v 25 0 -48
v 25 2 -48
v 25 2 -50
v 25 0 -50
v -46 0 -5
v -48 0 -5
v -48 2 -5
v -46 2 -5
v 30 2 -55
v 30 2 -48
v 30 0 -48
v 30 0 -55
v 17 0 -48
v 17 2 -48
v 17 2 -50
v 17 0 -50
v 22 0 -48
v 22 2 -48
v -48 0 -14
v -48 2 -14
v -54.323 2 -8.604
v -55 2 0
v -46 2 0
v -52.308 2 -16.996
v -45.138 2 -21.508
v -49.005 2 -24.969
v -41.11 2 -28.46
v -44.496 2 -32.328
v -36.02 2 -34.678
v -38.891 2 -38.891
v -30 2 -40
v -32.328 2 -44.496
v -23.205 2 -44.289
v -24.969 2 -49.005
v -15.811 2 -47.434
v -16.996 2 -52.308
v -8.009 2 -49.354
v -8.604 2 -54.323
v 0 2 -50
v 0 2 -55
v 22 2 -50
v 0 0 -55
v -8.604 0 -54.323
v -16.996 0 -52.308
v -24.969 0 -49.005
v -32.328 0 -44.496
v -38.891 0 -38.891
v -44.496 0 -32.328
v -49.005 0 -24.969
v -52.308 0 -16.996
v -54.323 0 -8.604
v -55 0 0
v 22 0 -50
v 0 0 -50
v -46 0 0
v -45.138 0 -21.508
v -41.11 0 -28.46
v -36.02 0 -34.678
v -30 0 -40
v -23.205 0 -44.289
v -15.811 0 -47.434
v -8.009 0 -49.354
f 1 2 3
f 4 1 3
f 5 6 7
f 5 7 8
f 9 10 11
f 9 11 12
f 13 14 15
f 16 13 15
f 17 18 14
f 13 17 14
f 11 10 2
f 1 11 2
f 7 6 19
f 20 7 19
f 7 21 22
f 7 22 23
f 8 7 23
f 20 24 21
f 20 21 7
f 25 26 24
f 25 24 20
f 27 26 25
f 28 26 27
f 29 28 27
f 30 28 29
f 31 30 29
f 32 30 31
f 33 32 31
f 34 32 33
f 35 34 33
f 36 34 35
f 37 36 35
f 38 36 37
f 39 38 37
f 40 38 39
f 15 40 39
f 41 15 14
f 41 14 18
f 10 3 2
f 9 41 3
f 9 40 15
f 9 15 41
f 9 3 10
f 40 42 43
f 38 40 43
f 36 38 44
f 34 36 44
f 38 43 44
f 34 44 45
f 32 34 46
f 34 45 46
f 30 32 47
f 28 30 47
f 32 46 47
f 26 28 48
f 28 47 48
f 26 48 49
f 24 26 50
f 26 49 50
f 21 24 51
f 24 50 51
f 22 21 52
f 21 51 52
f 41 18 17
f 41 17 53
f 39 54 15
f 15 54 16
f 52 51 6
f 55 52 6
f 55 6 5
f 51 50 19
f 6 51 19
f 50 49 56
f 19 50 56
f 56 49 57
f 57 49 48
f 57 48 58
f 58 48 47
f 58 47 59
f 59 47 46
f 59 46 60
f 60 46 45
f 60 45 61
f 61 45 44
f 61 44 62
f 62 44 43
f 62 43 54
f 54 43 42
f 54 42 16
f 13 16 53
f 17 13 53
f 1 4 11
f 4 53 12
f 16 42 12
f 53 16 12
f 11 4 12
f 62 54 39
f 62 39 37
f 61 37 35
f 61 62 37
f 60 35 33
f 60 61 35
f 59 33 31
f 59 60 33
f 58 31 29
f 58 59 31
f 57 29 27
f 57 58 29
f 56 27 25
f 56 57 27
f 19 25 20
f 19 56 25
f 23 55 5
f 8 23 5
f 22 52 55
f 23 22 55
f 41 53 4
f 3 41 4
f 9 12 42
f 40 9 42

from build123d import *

# Parameters (mm, degrees)
SKETCH1_R              = 50
BOSS_EXTRUDE2_DEPTH    = 2
SPLIT1_SURFACE_1_BACK  = 156.576
SPLIT1_SURFACE_1_DEPTH = 313.152
SPLIT1_SURFACE_2_BACK  = 156.576
SPLIT1_SURFACE_2_DEPTH = 313.152
BODY_DELETE1_DEPTH     = 2
BOSS_EXTRUDE3_DEPTH    = 2
BOSS_EXTRUDE5_START    = -2
SKETCH4_W              = 2
SKETCH4_H              = 5
BOSS_EXTRUDE5_DEPTH    = 2


# Read off the part's stored shape, not the designer's step: Body-Delete1
with BuildPart() as part:
    # Sketch1 → Boss-Extrude2 (new body)
    with BuildSketch(Plane(origin=(0, 0, 0), x_dir=(1, 0, 0), z_dir=(0, 1, 0))):
        with BuildLine():
            Line((22.912878475, 50), (30, 50))
            Line((30, 50), (30, 55))
            Line((30, 55), (0, 55))
            ThreePointArc((0, 55), (-11.7260394, -53.735463151), (22.912878475, 50))
        make_face()
        with Locations(Location((0, 0, 0), (0, 0, 270))):
            Circle(SKETCH1_R, mode=Mode.SUBTRACT)
    extrude(amount=BOSS_EXTRUDE2_DEPTH)


with BuildPart() as body_2:
    # Split1: the piece behind the surface
    add(part.part)
    # Split1 surface: a surface, the sketch's curves swept straight by 313.152 mm
    with BuildLine(Plane(origin=(0, 2, 0), x_dir=(1, 0, 0), z_dir=(0, 1, 0)).offset(-SPLIT1_SURFACE_1_BACK), mode=Mode.PRIVATE) as split1_surface_1_path:
        Line((0, 50), (71.831983425, 50))
        Line((71.831983425, 50), (71.831983425, -59.181674134))
        Line((71.831983425, -59.181674134), (-65.509549092, -59.181674134))
        Line((-65.509549092, -59.181674134), (-65.509549092, 0))
        Line((-65.509549092, 0), (0, 0))
        Line((0, 0), (0, 50))
    split1_surface_1 = Shell.extrude(split1_surface_1_path.wire(), (0 * SPLIT1_SURFACE_1_DEPTH, 1 * SPLIT1_SURFACE_1_DEPTH, 0 * SPLIT1_SURFACE_1_DEPTH))
    split(bisect_by=split1_surface_1, keep=Keep.BOTTOM)

    # Body-Delete1 outline → Body-Delete1 (cut)
    with BuildSketch(Plane(origin=(0, 0, 0), x_dir=(1, 0, 0), z_dir=(0, 1, 0))):
        with BuildLine():
            ThreePointArc((-55, 0), (29.705148408, -46.28827236), (22.912878475, 50))
            Line((22.912878475, 50), (0, 50))
            ThreePointArc((0, 50), (35.355339059, -35.355339059), (-50, 0))
            Line((-50, 0), (-55, 0))
        make_face()
    extrude(amount=BODY_DELETE1_DEPTH, mode=Mode.SUBTRACT)


with BuildPart() as part_1:
    add(part.part)

    # Split1: split by a surface, the side it looks to stays
    # Split1 surface: a surface, the sketch's curves swept straight by 313.152 mm
    with BuildLine(Plane(origin=(0, 2, 0), x_dir=(1, 0, 0), z_dir=(0, 1, 0)).offset(-SPLIT1_SURFACE_2_BACK), mode=Mode.PRIVATE) as split1_surface_2_path:
        Line((0, 50), (71.831983425, 50))
        Line((71.831983425, 50), (71.831983425, -59.181674134))
        Line((71.831983425, -59.181674134), (-65.509549092, -59.181674134))
        Line((-65.509549092, -59.181674134), (-65.509549092, 0))
        Line((-65.509549092, 0), (0, 0))
        Line((0, 0), (0, 50))
    split1_surface_2 = Shell.extrude(split1_surface_2_path.wire(), (0 * SPLIT1_SURFACE_2_DEPTH, 1 * SPLIT1_SURFACE_2_DEPTH, 0 * SPLIT1_SURFACE_2_DEPTH))
    split(bisect_by=split1_surface_2, keep=Keep.TOP)

    # Sketch3 → Boss-Extrude3 (add)
    with BuildSketch(Plane(origin=(0, 2, 0), x_dir=(1, 0, 0), z_dir=(0, 1, 0))):
        Polygon((30, 50), (30, 48), (25, 48), (25, 52), (30, 52), align=None)
        Polygon((22, 50), (22, 48), (17, 48), (17, 52), (22, 52), align=None)
    extrude(amount=-BOSS_EXTRUDE3_DEPTH)

    # Sketch4 → Boss-Extrude5 (add)
    with BuildSketch(Plane(origin=(0, 2, 0), x_dir=(1, 0, 0), z_dir=(0, 1, 0)).offset(BOSS_EXTRUDE5_START)):
        with Locations((-47, 2.5)):
            Rectangle(SKETCH4_W, SKETCH4_H)
        with BuildLine():
            ThreePointArc((-48, 14), (-49.497474683, 7.071067812), (-50, 0))
            Line((-50, 0), (-48, 0))
            Line((-48, 0), (-48, 5))
            Line((-48, 5), (-48, 14))
        make_face()
    extrude(amount=BOSS_EXTRUDE5_DEPTH)


solid = part_1.part
